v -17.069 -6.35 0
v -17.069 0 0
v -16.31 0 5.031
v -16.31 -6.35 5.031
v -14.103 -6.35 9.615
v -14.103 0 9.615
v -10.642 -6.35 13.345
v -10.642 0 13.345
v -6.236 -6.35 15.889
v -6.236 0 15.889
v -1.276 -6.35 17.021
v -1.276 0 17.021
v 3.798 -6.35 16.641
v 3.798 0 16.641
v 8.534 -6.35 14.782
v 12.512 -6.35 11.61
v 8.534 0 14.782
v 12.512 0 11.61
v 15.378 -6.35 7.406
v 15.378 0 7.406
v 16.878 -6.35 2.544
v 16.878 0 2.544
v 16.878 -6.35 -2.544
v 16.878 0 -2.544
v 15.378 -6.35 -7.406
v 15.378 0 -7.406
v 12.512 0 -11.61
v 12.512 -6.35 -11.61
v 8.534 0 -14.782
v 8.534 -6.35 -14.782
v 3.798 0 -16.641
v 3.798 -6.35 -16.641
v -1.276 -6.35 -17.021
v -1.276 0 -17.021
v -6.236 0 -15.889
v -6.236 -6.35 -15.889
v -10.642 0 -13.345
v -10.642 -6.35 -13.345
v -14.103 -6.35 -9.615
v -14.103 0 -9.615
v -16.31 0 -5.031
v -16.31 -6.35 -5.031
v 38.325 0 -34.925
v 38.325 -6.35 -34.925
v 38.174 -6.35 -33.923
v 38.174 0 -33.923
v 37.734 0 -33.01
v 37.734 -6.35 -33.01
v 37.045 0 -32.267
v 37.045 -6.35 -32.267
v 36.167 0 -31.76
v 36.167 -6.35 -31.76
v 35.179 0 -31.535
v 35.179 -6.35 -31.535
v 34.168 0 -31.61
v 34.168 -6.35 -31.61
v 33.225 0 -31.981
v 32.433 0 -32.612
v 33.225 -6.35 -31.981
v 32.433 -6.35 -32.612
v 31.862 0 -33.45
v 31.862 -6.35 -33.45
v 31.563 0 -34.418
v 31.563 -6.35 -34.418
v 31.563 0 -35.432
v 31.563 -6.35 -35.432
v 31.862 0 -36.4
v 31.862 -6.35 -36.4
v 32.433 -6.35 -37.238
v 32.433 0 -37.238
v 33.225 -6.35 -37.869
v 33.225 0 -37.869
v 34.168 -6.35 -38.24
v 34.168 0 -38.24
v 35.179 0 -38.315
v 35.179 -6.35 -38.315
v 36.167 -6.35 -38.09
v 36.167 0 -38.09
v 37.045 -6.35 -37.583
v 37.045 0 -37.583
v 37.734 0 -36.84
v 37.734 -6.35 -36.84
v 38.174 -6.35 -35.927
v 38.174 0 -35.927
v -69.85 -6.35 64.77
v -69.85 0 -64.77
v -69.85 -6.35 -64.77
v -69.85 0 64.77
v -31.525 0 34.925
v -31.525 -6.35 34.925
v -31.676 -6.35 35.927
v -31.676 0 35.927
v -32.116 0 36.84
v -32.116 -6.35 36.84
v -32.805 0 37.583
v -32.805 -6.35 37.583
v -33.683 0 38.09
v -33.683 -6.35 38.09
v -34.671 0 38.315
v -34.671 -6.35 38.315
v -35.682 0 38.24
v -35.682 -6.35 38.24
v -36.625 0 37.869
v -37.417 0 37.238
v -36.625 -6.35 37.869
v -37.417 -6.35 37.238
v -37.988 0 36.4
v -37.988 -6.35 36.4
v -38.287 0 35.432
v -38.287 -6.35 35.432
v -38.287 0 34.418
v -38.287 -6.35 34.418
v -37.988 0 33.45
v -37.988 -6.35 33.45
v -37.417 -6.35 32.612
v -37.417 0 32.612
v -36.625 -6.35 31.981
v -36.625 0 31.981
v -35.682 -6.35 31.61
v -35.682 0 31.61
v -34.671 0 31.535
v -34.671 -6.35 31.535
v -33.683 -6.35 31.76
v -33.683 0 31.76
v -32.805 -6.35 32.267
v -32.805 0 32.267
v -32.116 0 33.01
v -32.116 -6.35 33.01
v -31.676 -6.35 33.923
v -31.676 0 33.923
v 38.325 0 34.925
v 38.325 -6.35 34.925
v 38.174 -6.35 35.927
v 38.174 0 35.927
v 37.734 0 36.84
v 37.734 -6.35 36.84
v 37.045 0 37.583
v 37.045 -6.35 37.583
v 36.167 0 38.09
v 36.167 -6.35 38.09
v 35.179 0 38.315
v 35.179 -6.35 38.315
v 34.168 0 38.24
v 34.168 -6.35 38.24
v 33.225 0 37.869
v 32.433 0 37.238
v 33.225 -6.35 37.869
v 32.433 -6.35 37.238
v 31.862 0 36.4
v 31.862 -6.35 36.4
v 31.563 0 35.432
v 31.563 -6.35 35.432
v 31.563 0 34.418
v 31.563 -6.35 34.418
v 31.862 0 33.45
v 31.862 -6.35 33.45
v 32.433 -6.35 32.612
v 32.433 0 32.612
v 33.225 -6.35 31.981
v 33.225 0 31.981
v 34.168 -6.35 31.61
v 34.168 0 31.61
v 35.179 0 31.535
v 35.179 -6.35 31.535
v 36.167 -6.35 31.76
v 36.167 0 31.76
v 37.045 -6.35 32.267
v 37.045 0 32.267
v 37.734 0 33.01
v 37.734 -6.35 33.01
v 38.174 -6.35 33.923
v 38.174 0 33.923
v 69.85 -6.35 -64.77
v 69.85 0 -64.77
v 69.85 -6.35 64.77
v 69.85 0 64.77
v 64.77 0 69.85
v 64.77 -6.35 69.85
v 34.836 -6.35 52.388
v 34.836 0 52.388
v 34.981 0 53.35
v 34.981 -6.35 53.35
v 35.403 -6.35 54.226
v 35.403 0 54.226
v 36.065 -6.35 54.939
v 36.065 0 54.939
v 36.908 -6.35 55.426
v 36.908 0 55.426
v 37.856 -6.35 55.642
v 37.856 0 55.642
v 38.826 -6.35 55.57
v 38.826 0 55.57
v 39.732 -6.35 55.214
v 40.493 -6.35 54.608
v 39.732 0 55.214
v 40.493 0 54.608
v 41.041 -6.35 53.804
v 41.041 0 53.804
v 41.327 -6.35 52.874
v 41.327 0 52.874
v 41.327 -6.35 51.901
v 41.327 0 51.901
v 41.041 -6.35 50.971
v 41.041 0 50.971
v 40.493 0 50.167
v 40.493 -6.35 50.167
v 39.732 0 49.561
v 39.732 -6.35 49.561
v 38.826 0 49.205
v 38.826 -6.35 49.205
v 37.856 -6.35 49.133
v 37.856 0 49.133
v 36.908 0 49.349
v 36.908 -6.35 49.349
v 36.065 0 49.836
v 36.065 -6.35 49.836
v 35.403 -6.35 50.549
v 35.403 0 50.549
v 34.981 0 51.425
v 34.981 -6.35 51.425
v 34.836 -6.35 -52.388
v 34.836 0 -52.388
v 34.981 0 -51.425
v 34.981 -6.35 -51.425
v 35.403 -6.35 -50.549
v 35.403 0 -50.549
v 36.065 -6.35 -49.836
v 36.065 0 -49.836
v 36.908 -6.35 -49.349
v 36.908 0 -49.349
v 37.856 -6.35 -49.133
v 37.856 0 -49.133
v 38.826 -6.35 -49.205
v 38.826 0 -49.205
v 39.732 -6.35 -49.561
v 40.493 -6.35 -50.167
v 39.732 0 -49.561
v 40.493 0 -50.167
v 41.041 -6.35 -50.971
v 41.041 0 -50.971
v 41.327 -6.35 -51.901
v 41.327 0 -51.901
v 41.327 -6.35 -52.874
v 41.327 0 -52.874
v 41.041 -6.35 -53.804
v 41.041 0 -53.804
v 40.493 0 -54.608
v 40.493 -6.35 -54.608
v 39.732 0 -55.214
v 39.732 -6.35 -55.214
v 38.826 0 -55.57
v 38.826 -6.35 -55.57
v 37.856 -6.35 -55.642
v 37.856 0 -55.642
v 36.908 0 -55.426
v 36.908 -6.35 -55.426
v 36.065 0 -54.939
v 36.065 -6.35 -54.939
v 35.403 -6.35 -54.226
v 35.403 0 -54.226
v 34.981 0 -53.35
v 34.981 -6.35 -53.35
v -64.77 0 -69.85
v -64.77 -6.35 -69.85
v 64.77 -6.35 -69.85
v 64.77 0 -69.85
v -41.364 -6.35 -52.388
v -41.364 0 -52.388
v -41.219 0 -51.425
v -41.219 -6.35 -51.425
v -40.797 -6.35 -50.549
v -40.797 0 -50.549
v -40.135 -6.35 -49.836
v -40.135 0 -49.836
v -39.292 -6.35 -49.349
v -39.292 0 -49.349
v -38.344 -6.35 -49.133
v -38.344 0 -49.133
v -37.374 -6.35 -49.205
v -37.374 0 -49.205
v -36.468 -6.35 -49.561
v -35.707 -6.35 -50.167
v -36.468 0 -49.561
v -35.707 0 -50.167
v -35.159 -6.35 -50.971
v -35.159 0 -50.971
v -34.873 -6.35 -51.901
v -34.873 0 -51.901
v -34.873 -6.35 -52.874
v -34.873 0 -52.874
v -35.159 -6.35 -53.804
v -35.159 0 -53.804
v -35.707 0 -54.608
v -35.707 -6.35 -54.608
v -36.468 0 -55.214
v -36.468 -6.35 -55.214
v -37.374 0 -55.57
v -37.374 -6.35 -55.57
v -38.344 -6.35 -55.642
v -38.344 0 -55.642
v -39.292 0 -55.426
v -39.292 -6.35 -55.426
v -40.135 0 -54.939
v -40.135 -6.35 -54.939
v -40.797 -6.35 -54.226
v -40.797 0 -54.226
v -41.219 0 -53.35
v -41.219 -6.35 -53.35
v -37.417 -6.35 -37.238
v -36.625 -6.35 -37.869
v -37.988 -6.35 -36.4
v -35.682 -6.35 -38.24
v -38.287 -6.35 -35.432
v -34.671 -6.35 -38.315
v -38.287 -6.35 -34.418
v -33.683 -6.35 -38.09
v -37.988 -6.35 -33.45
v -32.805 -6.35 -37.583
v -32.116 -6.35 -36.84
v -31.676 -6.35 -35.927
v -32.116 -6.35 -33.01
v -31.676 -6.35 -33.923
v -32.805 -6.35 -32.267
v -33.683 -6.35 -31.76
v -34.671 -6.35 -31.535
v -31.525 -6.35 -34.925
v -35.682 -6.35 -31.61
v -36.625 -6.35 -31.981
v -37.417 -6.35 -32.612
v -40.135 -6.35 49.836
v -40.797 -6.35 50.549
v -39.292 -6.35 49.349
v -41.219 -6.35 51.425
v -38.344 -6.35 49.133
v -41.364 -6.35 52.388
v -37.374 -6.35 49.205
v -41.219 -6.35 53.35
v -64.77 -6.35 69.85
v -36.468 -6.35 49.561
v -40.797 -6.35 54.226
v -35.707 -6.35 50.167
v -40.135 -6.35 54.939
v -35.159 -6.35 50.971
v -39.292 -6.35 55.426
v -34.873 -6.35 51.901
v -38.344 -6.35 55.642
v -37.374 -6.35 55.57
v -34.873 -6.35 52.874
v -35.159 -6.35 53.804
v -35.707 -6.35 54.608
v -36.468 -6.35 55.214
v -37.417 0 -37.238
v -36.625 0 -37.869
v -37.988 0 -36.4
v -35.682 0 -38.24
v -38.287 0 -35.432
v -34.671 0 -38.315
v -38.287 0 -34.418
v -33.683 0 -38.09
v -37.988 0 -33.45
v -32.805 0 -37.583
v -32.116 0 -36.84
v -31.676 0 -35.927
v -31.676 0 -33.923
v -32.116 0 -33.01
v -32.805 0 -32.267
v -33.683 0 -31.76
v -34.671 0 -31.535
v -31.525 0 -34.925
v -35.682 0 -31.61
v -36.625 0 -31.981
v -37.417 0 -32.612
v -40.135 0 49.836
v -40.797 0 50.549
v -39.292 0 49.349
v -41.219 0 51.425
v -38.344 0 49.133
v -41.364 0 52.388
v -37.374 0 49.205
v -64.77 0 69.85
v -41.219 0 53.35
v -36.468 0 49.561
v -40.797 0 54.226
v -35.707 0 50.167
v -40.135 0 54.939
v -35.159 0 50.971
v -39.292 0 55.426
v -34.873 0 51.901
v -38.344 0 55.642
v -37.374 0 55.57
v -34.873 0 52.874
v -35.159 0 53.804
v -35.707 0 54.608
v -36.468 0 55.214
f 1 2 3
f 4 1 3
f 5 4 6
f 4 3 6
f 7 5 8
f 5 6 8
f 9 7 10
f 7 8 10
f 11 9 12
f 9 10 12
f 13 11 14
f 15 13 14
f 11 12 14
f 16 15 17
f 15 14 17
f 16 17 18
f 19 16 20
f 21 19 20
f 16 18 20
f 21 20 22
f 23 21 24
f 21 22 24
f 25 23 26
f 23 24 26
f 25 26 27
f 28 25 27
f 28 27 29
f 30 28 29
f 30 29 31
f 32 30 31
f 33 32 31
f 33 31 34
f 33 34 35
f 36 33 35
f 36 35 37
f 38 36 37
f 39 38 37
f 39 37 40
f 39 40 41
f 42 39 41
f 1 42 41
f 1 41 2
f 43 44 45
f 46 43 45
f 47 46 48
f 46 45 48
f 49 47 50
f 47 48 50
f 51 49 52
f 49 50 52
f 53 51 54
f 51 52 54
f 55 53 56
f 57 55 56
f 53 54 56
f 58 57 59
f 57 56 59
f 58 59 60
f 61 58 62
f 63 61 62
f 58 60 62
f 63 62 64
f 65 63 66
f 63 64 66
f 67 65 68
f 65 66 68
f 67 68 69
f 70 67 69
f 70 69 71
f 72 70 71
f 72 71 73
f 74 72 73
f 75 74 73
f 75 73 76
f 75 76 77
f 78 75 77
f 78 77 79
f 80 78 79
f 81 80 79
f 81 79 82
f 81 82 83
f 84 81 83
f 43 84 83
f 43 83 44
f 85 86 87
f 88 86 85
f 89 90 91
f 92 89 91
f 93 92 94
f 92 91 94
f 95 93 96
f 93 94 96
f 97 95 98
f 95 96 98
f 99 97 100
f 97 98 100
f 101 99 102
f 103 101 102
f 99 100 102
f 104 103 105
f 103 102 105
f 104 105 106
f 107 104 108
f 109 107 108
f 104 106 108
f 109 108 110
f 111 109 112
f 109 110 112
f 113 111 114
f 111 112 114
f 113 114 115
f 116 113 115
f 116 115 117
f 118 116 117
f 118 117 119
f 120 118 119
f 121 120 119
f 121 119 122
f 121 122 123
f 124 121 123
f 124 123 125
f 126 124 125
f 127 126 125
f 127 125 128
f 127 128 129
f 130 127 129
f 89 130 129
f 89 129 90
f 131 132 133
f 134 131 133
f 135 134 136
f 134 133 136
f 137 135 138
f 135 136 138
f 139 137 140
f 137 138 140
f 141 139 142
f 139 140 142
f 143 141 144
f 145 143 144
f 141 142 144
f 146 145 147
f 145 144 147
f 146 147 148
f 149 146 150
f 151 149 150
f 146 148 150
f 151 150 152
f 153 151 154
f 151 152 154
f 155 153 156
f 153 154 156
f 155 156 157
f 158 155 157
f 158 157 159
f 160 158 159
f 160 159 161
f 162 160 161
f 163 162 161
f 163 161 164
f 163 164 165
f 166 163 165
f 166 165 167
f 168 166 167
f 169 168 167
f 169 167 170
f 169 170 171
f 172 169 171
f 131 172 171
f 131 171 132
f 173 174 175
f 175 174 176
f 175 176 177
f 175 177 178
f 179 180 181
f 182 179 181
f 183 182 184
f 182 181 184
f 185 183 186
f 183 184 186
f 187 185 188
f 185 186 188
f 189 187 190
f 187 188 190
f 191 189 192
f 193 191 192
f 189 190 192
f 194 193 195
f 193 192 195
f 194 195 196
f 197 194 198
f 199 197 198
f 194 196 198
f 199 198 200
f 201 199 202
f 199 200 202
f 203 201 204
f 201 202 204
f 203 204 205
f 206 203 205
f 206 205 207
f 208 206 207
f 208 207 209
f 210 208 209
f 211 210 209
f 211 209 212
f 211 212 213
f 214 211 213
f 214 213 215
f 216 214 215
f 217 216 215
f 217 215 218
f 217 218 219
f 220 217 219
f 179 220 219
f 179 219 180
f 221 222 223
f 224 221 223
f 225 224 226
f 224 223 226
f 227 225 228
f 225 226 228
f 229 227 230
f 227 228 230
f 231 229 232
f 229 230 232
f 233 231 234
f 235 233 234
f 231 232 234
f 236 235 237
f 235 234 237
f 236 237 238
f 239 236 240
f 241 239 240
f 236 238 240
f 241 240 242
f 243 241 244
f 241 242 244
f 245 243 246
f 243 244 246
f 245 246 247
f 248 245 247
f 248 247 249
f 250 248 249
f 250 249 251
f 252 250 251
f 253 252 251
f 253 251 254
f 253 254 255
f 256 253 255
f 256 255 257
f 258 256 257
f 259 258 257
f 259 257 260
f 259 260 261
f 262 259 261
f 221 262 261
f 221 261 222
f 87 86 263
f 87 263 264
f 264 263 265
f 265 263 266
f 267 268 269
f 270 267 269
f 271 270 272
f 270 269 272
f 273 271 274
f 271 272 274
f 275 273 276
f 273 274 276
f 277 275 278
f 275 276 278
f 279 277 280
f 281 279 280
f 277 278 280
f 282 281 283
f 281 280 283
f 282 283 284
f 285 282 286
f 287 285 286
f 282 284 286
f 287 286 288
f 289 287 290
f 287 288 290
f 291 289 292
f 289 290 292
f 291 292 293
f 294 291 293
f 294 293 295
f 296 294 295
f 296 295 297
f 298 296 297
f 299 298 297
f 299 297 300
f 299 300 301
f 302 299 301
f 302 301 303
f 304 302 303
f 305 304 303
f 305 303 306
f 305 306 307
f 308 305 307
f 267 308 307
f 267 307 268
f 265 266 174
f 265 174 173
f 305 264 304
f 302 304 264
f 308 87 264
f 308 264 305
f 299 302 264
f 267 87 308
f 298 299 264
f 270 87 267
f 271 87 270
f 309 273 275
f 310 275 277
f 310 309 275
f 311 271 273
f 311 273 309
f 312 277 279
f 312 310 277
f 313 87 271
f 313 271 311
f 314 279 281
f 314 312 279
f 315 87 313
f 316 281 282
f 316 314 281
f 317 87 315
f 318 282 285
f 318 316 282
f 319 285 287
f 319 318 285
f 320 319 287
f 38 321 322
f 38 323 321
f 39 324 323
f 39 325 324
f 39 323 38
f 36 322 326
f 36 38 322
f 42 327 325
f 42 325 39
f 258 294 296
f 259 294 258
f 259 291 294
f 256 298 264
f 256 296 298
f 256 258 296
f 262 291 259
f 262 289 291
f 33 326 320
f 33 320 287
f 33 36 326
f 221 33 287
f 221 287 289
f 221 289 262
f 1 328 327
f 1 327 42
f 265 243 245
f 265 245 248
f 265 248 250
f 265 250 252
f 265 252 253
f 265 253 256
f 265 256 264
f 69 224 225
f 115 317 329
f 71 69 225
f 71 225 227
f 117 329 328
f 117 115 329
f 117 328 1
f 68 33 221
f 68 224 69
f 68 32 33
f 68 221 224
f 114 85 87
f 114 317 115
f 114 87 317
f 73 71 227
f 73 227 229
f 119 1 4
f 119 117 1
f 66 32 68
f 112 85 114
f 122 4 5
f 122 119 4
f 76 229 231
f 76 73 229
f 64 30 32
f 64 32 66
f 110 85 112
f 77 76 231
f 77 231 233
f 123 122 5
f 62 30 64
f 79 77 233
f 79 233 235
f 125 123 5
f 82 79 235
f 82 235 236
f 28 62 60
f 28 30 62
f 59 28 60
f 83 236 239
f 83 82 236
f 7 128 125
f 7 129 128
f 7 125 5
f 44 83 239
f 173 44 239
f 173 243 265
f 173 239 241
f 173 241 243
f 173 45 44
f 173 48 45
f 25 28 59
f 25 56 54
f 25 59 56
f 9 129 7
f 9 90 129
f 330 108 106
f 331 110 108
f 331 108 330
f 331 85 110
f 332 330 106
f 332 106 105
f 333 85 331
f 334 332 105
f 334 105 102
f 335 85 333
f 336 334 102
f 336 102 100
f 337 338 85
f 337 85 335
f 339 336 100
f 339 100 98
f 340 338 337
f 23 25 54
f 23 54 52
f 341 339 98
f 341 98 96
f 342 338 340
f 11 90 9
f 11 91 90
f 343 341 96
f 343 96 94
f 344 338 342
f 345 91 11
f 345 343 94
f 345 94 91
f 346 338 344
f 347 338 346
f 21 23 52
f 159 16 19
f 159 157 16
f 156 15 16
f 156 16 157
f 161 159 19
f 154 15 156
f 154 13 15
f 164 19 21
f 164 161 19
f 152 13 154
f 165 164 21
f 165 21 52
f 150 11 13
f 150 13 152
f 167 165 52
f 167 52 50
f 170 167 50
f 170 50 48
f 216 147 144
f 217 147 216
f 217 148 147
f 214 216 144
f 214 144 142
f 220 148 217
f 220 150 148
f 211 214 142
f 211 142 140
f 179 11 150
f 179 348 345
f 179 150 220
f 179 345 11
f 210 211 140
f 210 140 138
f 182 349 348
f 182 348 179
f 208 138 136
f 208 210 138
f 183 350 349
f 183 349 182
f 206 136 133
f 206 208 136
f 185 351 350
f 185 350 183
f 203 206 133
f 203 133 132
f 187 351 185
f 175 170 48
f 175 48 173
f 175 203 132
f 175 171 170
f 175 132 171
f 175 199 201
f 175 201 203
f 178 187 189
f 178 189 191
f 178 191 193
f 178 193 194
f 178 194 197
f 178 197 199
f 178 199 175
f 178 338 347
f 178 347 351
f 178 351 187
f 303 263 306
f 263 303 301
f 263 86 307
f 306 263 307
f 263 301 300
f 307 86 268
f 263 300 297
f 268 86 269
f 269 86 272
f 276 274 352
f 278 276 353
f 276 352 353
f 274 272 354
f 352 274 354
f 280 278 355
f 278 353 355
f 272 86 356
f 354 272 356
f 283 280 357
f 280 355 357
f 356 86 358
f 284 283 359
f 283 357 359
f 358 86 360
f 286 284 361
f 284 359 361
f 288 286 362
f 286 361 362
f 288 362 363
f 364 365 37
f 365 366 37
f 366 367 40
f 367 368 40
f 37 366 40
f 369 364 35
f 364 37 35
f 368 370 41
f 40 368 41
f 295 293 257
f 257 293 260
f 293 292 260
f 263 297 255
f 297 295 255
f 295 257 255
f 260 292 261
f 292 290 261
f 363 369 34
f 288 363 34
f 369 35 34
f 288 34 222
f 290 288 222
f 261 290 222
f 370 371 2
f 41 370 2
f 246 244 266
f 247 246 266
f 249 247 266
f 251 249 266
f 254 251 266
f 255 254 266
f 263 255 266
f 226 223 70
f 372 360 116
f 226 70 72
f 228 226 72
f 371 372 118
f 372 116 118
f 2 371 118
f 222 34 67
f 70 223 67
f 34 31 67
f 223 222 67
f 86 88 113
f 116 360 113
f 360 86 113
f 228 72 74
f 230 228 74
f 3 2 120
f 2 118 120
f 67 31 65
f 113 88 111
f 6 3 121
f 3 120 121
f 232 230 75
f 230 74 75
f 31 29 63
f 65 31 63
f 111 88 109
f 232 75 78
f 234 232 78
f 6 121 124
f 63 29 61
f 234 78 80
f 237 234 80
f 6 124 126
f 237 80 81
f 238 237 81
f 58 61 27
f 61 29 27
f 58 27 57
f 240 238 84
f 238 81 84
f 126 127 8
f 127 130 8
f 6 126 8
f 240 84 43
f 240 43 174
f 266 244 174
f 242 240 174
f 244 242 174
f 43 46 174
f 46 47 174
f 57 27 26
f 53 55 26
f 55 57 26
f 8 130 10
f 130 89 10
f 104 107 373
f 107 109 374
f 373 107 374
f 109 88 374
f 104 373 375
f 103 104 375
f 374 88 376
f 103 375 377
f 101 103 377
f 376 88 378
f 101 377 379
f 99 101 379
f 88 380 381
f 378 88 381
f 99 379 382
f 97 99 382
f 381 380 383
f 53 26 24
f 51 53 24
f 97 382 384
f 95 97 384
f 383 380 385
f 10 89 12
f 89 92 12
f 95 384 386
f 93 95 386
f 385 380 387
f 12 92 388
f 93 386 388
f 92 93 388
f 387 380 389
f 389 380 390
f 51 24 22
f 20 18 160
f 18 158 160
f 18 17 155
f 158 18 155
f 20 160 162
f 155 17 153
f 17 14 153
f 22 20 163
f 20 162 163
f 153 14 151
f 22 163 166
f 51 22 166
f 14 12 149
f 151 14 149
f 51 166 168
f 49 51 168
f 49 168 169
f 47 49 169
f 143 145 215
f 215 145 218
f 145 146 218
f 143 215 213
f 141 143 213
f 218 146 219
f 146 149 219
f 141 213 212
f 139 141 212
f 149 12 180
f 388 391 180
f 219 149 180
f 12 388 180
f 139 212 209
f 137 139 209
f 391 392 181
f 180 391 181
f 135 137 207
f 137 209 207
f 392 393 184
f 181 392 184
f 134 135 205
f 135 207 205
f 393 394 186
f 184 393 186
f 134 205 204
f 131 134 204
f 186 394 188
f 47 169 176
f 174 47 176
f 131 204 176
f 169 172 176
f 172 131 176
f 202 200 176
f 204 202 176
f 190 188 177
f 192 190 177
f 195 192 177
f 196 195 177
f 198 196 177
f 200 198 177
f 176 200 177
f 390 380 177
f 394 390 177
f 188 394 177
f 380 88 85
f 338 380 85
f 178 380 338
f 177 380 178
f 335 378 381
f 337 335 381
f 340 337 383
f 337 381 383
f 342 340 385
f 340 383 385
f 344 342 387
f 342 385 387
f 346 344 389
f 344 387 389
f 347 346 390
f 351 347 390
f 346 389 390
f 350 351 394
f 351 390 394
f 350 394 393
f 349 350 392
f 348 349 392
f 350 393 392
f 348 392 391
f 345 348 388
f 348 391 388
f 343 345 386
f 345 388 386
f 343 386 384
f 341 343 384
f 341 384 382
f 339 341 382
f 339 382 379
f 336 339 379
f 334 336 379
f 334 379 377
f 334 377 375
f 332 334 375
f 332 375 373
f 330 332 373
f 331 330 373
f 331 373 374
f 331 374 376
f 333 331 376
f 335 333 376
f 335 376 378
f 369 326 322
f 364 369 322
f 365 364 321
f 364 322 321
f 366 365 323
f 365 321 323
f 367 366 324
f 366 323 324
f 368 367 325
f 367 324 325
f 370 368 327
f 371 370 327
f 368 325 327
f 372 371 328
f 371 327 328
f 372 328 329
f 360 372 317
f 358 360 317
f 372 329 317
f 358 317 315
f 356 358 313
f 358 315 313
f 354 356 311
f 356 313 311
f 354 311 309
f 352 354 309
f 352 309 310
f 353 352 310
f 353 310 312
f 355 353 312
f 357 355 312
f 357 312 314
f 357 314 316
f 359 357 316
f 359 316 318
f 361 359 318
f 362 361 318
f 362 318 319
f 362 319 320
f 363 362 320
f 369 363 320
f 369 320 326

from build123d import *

# Parameters (mm, degrees)
F0_W     = 139.7
F0_H     = 139.7
F1_DEPTH = 6.35
F3_SIZE  = 5.08
F4_D     = 6.8
F6_D     = 6.5278
F8_D     = 34.1376


with BuildPart() as f1:
    # F0 (on Front) → F1 (new body)
    with BuildSketch(Plane.XZ):
        Rectangle(F0_W, F0_H)
    extrude(amount=F1_DEPTH)

    # F3
    f3_edges = [f1.edges().sort_by_distance(p)[0] for p in [
        (-69.85, -3.175, 69.85),
        (69.85, -3.175, 69.85),
        (69.85, -3.175, -69.85),
        (-69.85, -3.175, -69.85),
    ]]
    chamfer(f3_edges, length=F3_SIZE)

    # F4 (through all)
    with Locations(Plane(origin=(0, 0, 0), x_dir=(-1, 0, 0), z_dir=(0, 1, 0))):
        with Locations((-34.925, 34.925), (-34.925, -34.925), (34.925, -34.925), (34.925, 34.925)):
            Hole(F4_D / 2)

    # F6 (through all)
    with Locations(Plane.XZ.offset(6.35)):
        with Locations((38.1, 52.3875), (-38.1, 52.3875), (-38.1, -52.3875), (38.1, -52.3875)):
            Hole(F6_D / 2)

    # F8 (through all)
    with Locations(Plane.XZ.offset(6.35)):
        with Locations((0, 0)):
            Hole(F8_D / 2)


solid = f1.part
